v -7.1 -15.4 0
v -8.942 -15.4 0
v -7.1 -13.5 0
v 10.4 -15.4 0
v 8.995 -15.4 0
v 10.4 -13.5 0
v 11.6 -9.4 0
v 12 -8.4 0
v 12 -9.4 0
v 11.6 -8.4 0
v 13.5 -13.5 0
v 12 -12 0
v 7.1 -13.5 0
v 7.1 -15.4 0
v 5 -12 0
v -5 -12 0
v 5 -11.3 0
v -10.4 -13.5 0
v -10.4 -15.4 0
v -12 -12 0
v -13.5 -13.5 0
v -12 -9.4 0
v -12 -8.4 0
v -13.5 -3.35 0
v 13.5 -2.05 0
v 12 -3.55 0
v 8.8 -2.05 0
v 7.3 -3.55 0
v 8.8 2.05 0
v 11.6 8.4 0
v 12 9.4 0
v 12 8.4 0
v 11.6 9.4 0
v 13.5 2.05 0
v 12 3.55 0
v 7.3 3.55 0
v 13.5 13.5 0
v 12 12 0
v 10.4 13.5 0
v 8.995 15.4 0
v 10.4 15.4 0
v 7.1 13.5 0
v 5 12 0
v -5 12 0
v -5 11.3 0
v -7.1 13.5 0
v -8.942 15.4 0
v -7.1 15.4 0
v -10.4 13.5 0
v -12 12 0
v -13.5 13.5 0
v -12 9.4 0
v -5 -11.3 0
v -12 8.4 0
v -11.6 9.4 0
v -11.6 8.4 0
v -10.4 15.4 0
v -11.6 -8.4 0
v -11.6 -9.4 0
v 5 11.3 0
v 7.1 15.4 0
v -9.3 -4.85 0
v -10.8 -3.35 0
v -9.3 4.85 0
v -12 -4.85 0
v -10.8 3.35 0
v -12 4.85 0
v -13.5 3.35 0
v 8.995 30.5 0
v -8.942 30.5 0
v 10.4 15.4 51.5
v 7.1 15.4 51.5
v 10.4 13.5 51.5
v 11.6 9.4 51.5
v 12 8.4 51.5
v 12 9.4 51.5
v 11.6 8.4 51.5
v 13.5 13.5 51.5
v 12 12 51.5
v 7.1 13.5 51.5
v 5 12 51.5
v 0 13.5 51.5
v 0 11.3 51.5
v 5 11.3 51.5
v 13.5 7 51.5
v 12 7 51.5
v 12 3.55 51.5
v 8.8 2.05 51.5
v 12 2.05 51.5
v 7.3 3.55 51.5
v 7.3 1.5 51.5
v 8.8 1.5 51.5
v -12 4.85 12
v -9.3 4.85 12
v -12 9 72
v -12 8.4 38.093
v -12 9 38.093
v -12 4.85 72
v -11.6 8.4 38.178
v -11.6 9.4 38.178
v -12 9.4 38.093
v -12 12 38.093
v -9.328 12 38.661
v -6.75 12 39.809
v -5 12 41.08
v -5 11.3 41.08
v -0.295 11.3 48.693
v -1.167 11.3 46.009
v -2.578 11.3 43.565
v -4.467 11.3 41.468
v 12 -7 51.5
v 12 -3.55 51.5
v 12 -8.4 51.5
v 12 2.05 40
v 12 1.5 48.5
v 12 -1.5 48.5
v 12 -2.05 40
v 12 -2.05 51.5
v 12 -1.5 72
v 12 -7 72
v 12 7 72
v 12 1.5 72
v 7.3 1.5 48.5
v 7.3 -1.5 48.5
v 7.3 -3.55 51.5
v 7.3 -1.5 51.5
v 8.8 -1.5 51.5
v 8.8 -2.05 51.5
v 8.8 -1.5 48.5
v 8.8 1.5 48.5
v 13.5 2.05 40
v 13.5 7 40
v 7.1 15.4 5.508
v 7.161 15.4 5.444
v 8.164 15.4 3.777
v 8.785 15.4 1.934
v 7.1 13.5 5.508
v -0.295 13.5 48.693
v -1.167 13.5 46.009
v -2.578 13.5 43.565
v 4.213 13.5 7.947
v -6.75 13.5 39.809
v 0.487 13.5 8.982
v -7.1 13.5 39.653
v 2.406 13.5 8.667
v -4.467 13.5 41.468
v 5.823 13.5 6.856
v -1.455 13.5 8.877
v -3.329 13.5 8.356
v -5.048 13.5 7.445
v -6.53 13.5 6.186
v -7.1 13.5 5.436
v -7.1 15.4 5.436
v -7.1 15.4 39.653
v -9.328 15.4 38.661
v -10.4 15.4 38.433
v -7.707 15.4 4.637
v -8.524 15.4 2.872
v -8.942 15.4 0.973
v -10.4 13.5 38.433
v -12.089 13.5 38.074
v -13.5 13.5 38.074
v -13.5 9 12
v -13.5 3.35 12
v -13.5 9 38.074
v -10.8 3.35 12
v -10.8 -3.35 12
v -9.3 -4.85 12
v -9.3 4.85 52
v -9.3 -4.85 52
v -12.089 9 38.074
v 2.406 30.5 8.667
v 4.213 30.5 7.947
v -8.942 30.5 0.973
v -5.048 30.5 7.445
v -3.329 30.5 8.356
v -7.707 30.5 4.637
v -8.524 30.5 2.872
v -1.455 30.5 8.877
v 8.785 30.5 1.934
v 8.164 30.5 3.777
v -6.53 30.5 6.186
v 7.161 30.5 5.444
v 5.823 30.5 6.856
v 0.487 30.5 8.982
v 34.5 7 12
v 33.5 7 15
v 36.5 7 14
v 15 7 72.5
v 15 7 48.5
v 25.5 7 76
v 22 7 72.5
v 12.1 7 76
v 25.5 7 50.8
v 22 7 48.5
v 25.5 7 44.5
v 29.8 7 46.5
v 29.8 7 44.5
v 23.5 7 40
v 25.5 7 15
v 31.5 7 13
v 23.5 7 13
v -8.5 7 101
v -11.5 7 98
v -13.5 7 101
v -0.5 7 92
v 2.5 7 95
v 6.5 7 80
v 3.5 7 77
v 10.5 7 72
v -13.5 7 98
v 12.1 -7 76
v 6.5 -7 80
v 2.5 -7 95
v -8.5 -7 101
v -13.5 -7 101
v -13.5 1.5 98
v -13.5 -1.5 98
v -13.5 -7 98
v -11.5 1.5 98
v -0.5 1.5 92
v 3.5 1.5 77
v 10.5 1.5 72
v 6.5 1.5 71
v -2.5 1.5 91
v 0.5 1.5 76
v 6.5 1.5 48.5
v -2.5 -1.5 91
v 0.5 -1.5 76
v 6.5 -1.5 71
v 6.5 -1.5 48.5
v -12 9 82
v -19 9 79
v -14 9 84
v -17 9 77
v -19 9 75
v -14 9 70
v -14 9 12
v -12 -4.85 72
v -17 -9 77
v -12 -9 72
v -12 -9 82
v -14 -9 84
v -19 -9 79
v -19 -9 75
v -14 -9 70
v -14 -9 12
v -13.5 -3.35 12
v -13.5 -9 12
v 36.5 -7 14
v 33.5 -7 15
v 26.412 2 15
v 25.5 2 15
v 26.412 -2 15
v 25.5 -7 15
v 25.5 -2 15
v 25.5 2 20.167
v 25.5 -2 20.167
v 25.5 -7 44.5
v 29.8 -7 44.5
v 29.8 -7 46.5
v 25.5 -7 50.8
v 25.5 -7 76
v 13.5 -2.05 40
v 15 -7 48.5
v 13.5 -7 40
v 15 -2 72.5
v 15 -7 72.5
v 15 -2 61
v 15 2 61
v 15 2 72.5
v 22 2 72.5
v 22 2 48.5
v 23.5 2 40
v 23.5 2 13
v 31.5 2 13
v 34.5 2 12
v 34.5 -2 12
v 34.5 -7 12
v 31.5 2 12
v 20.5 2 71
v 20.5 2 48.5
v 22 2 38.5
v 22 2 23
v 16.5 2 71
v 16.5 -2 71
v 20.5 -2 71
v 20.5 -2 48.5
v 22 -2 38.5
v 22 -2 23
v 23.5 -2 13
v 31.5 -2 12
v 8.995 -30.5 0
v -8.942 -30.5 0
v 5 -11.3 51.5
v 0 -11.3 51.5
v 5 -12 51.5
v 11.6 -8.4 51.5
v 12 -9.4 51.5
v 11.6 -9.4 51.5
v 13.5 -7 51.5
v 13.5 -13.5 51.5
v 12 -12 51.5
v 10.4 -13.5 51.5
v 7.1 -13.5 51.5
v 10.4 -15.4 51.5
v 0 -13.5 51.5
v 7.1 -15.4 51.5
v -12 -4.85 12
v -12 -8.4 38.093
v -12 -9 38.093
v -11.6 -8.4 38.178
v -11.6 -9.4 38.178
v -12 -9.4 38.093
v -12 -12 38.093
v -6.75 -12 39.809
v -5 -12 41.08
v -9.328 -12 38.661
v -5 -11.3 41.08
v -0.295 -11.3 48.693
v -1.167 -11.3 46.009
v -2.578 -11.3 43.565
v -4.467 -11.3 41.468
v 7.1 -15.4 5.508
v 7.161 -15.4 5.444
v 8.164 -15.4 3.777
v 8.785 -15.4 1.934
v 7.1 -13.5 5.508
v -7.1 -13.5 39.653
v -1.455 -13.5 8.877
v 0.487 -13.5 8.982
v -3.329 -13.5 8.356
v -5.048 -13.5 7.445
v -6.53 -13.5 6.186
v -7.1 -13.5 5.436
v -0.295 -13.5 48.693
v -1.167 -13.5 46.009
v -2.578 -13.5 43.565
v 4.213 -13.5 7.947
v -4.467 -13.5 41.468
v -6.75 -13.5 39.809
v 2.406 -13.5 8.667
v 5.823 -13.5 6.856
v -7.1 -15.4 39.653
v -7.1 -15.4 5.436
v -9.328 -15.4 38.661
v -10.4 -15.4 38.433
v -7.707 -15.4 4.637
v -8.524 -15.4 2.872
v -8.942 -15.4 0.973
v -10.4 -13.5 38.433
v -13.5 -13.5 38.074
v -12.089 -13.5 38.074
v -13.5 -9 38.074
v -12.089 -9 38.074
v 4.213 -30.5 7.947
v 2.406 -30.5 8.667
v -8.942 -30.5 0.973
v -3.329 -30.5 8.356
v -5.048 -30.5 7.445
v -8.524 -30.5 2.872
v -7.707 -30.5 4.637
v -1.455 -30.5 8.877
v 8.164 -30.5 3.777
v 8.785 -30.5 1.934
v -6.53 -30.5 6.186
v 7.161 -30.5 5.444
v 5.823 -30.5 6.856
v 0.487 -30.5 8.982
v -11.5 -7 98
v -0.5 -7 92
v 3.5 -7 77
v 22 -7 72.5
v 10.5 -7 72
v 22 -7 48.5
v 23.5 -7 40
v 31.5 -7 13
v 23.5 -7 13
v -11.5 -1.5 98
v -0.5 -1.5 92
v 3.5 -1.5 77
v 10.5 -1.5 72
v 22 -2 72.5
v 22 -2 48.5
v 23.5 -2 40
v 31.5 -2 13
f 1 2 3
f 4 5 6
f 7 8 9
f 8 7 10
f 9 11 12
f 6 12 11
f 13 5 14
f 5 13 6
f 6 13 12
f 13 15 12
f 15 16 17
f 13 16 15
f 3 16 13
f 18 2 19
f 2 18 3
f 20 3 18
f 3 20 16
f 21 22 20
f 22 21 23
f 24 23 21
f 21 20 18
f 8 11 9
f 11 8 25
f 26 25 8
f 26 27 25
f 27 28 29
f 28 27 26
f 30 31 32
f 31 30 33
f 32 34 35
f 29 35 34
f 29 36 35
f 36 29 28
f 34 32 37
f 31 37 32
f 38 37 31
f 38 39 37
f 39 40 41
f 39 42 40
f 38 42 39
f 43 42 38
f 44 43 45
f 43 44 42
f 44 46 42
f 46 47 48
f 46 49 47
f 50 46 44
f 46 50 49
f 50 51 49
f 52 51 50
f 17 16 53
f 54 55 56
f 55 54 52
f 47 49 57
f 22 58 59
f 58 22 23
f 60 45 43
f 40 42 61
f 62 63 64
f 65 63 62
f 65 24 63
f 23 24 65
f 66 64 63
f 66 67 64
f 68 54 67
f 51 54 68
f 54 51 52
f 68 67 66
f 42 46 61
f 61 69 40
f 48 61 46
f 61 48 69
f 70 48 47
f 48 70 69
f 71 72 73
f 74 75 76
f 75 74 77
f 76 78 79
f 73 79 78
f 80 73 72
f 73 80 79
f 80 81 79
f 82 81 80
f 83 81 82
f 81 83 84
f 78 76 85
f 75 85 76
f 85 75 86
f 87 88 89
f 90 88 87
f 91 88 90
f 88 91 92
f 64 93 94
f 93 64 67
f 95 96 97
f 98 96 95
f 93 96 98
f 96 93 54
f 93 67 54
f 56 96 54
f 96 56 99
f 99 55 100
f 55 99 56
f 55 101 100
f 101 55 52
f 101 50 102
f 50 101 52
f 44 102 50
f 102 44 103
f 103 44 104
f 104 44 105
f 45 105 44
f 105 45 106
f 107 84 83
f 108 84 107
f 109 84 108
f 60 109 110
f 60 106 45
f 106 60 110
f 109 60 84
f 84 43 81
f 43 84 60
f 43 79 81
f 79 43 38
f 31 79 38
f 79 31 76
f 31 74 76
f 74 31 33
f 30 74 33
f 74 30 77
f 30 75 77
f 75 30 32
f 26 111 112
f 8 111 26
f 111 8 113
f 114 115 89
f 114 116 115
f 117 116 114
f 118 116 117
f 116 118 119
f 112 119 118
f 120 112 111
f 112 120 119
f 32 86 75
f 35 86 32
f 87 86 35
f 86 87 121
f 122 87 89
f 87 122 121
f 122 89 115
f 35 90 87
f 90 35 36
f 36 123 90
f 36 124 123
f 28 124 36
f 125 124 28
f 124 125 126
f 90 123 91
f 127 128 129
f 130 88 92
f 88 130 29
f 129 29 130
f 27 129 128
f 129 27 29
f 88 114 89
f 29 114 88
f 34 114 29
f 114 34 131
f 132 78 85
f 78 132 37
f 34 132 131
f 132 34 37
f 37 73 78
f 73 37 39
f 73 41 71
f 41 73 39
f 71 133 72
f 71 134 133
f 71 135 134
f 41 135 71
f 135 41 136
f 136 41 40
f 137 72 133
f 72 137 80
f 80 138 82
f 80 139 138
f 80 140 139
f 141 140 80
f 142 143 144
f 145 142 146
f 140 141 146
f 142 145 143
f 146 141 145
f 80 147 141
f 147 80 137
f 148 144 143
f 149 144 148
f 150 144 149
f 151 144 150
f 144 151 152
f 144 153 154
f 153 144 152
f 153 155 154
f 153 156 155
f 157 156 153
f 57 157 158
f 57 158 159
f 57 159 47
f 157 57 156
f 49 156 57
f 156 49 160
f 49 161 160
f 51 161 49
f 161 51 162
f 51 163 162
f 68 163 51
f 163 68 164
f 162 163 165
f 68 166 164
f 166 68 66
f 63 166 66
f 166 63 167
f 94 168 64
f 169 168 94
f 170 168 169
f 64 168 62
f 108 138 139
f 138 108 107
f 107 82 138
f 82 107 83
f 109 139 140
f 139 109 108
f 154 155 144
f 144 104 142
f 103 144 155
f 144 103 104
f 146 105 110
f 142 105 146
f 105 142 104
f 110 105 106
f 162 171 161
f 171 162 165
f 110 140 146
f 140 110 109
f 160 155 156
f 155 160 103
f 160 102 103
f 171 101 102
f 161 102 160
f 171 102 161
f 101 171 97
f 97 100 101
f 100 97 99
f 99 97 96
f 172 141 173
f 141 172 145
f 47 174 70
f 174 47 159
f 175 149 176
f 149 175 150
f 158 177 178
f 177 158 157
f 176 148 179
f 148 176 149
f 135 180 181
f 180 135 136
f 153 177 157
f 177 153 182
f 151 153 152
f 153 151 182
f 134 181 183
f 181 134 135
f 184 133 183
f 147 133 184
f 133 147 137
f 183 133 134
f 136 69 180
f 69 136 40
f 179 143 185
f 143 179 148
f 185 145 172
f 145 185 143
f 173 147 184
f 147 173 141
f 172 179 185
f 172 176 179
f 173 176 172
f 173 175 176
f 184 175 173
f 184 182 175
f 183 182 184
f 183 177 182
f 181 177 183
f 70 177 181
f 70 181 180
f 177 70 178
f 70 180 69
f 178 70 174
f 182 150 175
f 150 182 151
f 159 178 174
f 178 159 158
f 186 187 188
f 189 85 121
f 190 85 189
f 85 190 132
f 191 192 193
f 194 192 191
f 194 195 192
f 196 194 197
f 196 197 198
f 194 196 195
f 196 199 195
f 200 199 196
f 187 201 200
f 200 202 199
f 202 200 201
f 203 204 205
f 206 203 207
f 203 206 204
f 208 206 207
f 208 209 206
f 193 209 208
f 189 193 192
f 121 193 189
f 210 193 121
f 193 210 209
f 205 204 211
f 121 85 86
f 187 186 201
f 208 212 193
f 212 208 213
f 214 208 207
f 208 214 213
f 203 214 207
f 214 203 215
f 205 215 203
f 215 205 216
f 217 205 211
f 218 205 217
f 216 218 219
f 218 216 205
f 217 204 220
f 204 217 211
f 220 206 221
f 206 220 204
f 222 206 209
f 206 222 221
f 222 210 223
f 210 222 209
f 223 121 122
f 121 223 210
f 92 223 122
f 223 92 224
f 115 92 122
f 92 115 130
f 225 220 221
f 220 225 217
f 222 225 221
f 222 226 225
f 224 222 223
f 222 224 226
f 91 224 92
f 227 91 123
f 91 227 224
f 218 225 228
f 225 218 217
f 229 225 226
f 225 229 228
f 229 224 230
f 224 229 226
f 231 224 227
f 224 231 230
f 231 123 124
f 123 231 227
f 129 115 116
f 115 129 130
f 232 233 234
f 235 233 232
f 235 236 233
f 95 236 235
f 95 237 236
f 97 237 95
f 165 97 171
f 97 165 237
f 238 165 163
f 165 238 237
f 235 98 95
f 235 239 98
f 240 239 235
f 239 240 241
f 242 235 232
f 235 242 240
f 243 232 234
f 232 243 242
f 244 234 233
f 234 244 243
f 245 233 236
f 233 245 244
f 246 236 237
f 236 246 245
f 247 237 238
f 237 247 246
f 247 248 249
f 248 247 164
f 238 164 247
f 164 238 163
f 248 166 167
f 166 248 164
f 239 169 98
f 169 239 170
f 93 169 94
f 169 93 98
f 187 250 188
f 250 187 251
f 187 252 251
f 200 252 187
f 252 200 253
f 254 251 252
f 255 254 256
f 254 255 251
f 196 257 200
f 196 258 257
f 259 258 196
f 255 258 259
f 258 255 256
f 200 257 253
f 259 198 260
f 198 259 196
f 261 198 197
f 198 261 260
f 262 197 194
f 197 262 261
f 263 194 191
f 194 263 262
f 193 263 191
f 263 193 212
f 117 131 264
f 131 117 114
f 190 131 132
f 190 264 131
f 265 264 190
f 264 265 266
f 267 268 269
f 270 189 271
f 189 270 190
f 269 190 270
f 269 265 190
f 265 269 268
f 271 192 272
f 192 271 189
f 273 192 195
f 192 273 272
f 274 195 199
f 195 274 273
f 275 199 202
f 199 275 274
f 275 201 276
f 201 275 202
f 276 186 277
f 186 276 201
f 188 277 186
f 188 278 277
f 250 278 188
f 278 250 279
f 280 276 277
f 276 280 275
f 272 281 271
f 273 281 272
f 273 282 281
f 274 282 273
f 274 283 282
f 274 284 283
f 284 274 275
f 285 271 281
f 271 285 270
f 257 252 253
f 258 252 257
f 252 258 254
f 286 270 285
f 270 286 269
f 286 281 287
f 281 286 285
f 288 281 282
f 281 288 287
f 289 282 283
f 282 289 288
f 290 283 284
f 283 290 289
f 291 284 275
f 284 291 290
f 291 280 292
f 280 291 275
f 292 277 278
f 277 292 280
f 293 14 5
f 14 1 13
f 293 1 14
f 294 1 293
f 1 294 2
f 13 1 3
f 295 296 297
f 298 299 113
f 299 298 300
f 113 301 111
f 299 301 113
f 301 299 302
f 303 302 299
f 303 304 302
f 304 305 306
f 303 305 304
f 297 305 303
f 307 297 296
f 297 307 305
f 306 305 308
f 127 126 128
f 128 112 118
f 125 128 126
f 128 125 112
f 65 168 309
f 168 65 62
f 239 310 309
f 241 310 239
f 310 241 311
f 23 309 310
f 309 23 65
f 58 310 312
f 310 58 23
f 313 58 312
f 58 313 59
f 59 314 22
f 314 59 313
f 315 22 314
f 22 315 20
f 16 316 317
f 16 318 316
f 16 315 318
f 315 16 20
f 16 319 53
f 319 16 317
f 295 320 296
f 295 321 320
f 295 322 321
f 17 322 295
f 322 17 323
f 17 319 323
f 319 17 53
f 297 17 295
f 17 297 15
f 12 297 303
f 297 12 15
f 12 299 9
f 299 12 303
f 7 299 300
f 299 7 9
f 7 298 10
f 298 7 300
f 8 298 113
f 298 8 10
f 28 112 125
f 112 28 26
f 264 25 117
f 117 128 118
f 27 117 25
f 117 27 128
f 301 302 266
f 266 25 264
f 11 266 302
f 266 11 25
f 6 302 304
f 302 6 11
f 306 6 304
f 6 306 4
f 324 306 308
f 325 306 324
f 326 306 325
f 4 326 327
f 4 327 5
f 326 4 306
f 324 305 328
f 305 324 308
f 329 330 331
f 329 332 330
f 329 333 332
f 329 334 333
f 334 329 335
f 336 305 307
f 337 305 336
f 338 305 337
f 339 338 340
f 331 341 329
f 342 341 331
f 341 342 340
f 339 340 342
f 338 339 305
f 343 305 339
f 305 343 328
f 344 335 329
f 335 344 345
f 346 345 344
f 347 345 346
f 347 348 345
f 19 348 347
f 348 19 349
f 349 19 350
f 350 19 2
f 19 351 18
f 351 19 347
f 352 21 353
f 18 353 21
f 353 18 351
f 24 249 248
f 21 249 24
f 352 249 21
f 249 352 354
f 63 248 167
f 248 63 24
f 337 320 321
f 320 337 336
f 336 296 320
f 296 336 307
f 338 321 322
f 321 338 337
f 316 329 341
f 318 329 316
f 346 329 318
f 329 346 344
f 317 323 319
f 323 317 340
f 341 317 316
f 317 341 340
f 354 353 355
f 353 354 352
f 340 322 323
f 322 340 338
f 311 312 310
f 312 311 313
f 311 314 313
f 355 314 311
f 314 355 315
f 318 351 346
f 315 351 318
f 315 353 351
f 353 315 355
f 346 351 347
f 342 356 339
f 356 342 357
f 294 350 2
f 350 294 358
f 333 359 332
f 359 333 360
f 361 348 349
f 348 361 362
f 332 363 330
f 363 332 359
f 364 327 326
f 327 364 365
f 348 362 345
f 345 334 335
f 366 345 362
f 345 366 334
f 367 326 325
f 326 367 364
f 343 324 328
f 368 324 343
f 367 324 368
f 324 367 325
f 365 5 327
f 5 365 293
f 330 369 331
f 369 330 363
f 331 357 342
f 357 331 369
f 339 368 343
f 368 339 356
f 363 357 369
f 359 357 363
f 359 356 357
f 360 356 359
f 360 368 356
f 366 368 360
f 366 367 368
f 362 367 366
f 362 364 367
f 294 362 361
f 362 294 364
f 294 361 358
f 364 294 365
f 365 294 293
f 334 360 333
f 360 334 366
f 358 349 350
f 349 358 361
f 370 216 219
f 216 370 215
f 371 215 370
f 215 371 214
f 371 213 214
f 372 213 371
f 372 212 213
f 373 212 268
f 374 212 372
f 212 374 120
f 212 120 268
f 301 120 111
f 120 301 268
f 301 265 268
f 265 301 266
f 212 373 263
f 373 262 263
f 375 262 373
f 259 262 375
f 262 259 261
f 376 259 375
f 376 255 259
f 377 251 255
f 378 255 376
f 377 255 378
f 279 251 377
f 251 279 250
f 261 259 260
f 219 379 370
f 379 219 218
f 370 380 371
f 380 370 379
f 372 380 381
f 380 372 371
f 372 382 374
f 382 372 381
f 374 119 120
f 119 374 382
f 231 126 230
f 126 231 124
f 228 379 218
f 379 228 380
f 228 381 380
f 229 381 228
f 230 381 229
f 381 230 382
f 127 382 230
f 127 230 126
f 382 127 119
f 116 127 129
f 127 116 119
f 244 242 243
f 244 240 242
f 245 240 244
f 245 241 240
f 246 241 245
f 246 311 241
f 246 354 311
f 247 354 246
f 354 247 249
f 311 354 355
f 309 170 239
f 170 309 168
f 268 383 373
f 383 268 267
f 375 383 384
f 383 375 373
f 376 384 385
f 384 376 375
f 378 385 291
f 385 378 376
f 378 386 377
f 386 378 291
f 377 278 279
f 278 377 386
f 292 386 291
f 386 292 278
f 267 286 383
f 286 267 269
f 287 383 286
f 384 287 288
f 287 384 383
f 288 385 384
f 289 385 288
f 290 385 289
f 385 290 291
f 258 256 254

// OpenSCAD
// V70 30756127 trekhaakafdekkap (Tow Bar Cover) 
// version 2 extra reinforcement and some fixes
// version 3 fine tuning (spring should be bigger)

m=1.5;
// base size and length
bs=27; bs2=bs/2;
bl=48.5+3;

// looking into bracket from behind, 
// 90 degrees counter clockwise
// drawing only half (mirror other half) 
p10=[
  // at the left inside going clockwise
  // higher and less deep nodge
  // select -Z to view this!
  [4.20,     0.000],
  [4.20,     4.850],
  [m,        4.850],
  [m,        8.400],
  [m+0.4,    8.400],
  [m+0.4,    9.400],
  [m,        9.400],
  [m,        bs2-m],
  [m+7,      bs2-m],
  [m+7,      bs2-2.2],
  [bs-m-7,   bs2-2.2],
  [bs-m-7,   bs2-m],
  [bs-m,     bs2-m],
  [bs-m,     9.400],
  [bs-m-0.4, 9.400],
  [bs-m-0.4, 8.400],
  [bs-m,     8.400],
  [bs-m,     3.550],
  [bs-6.2,   3.550],
  [bs-6.2,   0.000],
  // at the right side inside
  [bs-6.2+m,0.000  ],
  [bs-6.2+m,3.550-m],
  [bs,      3.550-m],
  [bs,      bs2    ],
  // begin of extra support rail?
  [bs-3.10 ,bs2    ],
  [bs-3.10 ,bs2+1.9],
  [bs-6.40 ,bs2+1.9],
  [bs-6.40 ,bs2    ],
  [6.40,    bs2    ],
  [6.40,    bs2+1.9],
  [3.10,    bs2+1.9],
  [3.10,    bs2    ],
  // end of extra support rail
  [0,       bs2    ],
  [0,       4.850-m],
  [4.20-m,  4.850-m],
  [4.20-m,  0.000  ]
];

// cylinder diameter and height 
//for the half moons sideways
cd=18;
ch=17;

// spring on the right side
mx=2;
px=10;
p20=[
  // spring between 15 and 74 mm and
  // spacing of 8
  [ 0, 40.0],
  [ m, 48.5],
  [ m, 74-m],
  // first bend
  [px-m, 74-m],
  [px-m, 48.5],
  [px,   40.0],
  [px, 13],
  [px+8, 13],
  [px+11, 12],
  // second bend (handle)
  [px+11+mx, 12+mx],
  [px+8+mx, 13+mx],
  [px+mx, 13+mx],
  // notch (keeping it in its place)
  [px+mx,     44.5],
  [px+mx+4.3, 44.5],
  [px+mx+4.3, 44.5+mx],
  [px+mx,     44.5+mx+4.3],
  // and go further up
  [px+mx, 74+mx],
  [ 0-m,  74+mx],
  [ 0-m,  48.5 ],
  [ 0-m,  40.0 ],  
];
// extra support
p21=[
  [ m,     64-m-m],
  [ m+m,   74-m-m],
  [px-m-m, 74-m-m],
  [px-m-m, 48.5],
  [px-m,   38.5],
  [px-m,   23  ],
  [px,     13  ],
  [px+8,   12  ],
  [px+11,  12  ],
  [px+8,   13+m],
  [px+m+m, 13+m],
  [px+m,   23  ],
  [px+m,   48.5],
  [px+m,   74-m],
  [ 0,     74-m],
  [ 0,     64-m]
];

// lip 1 (attached to the spring)
mxl=3;
p30z=72;
p30=[
  // going up
  [      0,0     ],
  [      0,mxl   ],
  [     -7,mxl+ 5],
  [    -11,mxl+20],
  [    -22,mxl+26],
  [    -27,mxl+26],
  // going down
  [    -27,    26],
  [-mxl-22,    26],
  [-mxl-11,    20],
  [-mxl -7,     5],
  [-mxl   ,     0]
];
p31=[
  // going up
  [      0,   -23.5],
  [      0,mxl     ],
  [     -7,mxl+ 5  ],
  [    -11,mxl+20  ],
  [    -22,mxl+26  ],
  [    -27,mxl+26  ],
  // going down
  [      -27,    26  ],
  [-mxl-11-2,    19  ],
  [-mxl -7-3,     4  ],
  [-mxl   -4,    -1  ],
  [       -7,   -23.5]
];

// lip 2 on the top side
// this piece is guessed from an internet image
// found here:
// https://zwedenparts.com/product/beugel-afdekplaat-afneembare-trekhaak-orig-volvo-xc60/
p40z=32;
p40=[
  // going up
  [  0,  -20   ],
  [  0,   40   ],
  [ -5,   45   ],
  [  0,   50   ],
  [-mx,   50+mx],
  [-mx-5, 45+mx],
  [-mx-5, 45   ],
  [-mx-5, 45-mx],
  [-mx  , 40-mx],
  [-mx  ,-20   ] 
];
// extra support
p41=[
  [  0,    -20   ],
  [  0,     40   ],
  [4.2-m,   20   ],
  [4.2-m,  -20   ]
];

module half() {
    translate([-bs2,0,0]) {
        difference() {
            linear_extrude(height=bl) {
              polygon(p10);
            }
            translate([0,-0.1,bl])
              rotate([-90,0,0])
              cylinder(h=bs2+1.9+0.2,d=bs);
        }
    }
    translate([0,bs2,0]) rotate([-90,0,0])
        difference() {
            cylinder(h=ch,d=cd-0.01);
            translate([-cd/2,0,-0.01]) cube([cd,cd/2,ch+0.02]);
        }

    translate([bs2,0,0]) rotate([90,0,0])
        translate([0,0,-7])
        linear_extrude(height=7)
            polygon(p20);
    translate([bs2,0,0]) rotate([90,0,0])
        translate([0,0,-2])
        linear_extrude(height=2)
            polygon(p21);
            
    translate([bs2,0,p30z]) rotate([90,0,0]) {
        translate([0,0,-7]) 
          linear_extrude(height=7)
            polygon(p30);
        translate([0,0,-mxl/2])              
          linear_extrude(height=mxl/2)
            polygon(p31);    
      }
      
    translate([-bs2-m+mxl,0,p40z]) rotate([90,0,0]) {
      translate([0,0,-9])
        linear_extrude(height=9)
        polygon(p40);
      translate([0,0,-4.85])
        linear_extrude(height=4.85)
        polygon(p41);
    }
}

half();
mirror([0,1,0]) half();
